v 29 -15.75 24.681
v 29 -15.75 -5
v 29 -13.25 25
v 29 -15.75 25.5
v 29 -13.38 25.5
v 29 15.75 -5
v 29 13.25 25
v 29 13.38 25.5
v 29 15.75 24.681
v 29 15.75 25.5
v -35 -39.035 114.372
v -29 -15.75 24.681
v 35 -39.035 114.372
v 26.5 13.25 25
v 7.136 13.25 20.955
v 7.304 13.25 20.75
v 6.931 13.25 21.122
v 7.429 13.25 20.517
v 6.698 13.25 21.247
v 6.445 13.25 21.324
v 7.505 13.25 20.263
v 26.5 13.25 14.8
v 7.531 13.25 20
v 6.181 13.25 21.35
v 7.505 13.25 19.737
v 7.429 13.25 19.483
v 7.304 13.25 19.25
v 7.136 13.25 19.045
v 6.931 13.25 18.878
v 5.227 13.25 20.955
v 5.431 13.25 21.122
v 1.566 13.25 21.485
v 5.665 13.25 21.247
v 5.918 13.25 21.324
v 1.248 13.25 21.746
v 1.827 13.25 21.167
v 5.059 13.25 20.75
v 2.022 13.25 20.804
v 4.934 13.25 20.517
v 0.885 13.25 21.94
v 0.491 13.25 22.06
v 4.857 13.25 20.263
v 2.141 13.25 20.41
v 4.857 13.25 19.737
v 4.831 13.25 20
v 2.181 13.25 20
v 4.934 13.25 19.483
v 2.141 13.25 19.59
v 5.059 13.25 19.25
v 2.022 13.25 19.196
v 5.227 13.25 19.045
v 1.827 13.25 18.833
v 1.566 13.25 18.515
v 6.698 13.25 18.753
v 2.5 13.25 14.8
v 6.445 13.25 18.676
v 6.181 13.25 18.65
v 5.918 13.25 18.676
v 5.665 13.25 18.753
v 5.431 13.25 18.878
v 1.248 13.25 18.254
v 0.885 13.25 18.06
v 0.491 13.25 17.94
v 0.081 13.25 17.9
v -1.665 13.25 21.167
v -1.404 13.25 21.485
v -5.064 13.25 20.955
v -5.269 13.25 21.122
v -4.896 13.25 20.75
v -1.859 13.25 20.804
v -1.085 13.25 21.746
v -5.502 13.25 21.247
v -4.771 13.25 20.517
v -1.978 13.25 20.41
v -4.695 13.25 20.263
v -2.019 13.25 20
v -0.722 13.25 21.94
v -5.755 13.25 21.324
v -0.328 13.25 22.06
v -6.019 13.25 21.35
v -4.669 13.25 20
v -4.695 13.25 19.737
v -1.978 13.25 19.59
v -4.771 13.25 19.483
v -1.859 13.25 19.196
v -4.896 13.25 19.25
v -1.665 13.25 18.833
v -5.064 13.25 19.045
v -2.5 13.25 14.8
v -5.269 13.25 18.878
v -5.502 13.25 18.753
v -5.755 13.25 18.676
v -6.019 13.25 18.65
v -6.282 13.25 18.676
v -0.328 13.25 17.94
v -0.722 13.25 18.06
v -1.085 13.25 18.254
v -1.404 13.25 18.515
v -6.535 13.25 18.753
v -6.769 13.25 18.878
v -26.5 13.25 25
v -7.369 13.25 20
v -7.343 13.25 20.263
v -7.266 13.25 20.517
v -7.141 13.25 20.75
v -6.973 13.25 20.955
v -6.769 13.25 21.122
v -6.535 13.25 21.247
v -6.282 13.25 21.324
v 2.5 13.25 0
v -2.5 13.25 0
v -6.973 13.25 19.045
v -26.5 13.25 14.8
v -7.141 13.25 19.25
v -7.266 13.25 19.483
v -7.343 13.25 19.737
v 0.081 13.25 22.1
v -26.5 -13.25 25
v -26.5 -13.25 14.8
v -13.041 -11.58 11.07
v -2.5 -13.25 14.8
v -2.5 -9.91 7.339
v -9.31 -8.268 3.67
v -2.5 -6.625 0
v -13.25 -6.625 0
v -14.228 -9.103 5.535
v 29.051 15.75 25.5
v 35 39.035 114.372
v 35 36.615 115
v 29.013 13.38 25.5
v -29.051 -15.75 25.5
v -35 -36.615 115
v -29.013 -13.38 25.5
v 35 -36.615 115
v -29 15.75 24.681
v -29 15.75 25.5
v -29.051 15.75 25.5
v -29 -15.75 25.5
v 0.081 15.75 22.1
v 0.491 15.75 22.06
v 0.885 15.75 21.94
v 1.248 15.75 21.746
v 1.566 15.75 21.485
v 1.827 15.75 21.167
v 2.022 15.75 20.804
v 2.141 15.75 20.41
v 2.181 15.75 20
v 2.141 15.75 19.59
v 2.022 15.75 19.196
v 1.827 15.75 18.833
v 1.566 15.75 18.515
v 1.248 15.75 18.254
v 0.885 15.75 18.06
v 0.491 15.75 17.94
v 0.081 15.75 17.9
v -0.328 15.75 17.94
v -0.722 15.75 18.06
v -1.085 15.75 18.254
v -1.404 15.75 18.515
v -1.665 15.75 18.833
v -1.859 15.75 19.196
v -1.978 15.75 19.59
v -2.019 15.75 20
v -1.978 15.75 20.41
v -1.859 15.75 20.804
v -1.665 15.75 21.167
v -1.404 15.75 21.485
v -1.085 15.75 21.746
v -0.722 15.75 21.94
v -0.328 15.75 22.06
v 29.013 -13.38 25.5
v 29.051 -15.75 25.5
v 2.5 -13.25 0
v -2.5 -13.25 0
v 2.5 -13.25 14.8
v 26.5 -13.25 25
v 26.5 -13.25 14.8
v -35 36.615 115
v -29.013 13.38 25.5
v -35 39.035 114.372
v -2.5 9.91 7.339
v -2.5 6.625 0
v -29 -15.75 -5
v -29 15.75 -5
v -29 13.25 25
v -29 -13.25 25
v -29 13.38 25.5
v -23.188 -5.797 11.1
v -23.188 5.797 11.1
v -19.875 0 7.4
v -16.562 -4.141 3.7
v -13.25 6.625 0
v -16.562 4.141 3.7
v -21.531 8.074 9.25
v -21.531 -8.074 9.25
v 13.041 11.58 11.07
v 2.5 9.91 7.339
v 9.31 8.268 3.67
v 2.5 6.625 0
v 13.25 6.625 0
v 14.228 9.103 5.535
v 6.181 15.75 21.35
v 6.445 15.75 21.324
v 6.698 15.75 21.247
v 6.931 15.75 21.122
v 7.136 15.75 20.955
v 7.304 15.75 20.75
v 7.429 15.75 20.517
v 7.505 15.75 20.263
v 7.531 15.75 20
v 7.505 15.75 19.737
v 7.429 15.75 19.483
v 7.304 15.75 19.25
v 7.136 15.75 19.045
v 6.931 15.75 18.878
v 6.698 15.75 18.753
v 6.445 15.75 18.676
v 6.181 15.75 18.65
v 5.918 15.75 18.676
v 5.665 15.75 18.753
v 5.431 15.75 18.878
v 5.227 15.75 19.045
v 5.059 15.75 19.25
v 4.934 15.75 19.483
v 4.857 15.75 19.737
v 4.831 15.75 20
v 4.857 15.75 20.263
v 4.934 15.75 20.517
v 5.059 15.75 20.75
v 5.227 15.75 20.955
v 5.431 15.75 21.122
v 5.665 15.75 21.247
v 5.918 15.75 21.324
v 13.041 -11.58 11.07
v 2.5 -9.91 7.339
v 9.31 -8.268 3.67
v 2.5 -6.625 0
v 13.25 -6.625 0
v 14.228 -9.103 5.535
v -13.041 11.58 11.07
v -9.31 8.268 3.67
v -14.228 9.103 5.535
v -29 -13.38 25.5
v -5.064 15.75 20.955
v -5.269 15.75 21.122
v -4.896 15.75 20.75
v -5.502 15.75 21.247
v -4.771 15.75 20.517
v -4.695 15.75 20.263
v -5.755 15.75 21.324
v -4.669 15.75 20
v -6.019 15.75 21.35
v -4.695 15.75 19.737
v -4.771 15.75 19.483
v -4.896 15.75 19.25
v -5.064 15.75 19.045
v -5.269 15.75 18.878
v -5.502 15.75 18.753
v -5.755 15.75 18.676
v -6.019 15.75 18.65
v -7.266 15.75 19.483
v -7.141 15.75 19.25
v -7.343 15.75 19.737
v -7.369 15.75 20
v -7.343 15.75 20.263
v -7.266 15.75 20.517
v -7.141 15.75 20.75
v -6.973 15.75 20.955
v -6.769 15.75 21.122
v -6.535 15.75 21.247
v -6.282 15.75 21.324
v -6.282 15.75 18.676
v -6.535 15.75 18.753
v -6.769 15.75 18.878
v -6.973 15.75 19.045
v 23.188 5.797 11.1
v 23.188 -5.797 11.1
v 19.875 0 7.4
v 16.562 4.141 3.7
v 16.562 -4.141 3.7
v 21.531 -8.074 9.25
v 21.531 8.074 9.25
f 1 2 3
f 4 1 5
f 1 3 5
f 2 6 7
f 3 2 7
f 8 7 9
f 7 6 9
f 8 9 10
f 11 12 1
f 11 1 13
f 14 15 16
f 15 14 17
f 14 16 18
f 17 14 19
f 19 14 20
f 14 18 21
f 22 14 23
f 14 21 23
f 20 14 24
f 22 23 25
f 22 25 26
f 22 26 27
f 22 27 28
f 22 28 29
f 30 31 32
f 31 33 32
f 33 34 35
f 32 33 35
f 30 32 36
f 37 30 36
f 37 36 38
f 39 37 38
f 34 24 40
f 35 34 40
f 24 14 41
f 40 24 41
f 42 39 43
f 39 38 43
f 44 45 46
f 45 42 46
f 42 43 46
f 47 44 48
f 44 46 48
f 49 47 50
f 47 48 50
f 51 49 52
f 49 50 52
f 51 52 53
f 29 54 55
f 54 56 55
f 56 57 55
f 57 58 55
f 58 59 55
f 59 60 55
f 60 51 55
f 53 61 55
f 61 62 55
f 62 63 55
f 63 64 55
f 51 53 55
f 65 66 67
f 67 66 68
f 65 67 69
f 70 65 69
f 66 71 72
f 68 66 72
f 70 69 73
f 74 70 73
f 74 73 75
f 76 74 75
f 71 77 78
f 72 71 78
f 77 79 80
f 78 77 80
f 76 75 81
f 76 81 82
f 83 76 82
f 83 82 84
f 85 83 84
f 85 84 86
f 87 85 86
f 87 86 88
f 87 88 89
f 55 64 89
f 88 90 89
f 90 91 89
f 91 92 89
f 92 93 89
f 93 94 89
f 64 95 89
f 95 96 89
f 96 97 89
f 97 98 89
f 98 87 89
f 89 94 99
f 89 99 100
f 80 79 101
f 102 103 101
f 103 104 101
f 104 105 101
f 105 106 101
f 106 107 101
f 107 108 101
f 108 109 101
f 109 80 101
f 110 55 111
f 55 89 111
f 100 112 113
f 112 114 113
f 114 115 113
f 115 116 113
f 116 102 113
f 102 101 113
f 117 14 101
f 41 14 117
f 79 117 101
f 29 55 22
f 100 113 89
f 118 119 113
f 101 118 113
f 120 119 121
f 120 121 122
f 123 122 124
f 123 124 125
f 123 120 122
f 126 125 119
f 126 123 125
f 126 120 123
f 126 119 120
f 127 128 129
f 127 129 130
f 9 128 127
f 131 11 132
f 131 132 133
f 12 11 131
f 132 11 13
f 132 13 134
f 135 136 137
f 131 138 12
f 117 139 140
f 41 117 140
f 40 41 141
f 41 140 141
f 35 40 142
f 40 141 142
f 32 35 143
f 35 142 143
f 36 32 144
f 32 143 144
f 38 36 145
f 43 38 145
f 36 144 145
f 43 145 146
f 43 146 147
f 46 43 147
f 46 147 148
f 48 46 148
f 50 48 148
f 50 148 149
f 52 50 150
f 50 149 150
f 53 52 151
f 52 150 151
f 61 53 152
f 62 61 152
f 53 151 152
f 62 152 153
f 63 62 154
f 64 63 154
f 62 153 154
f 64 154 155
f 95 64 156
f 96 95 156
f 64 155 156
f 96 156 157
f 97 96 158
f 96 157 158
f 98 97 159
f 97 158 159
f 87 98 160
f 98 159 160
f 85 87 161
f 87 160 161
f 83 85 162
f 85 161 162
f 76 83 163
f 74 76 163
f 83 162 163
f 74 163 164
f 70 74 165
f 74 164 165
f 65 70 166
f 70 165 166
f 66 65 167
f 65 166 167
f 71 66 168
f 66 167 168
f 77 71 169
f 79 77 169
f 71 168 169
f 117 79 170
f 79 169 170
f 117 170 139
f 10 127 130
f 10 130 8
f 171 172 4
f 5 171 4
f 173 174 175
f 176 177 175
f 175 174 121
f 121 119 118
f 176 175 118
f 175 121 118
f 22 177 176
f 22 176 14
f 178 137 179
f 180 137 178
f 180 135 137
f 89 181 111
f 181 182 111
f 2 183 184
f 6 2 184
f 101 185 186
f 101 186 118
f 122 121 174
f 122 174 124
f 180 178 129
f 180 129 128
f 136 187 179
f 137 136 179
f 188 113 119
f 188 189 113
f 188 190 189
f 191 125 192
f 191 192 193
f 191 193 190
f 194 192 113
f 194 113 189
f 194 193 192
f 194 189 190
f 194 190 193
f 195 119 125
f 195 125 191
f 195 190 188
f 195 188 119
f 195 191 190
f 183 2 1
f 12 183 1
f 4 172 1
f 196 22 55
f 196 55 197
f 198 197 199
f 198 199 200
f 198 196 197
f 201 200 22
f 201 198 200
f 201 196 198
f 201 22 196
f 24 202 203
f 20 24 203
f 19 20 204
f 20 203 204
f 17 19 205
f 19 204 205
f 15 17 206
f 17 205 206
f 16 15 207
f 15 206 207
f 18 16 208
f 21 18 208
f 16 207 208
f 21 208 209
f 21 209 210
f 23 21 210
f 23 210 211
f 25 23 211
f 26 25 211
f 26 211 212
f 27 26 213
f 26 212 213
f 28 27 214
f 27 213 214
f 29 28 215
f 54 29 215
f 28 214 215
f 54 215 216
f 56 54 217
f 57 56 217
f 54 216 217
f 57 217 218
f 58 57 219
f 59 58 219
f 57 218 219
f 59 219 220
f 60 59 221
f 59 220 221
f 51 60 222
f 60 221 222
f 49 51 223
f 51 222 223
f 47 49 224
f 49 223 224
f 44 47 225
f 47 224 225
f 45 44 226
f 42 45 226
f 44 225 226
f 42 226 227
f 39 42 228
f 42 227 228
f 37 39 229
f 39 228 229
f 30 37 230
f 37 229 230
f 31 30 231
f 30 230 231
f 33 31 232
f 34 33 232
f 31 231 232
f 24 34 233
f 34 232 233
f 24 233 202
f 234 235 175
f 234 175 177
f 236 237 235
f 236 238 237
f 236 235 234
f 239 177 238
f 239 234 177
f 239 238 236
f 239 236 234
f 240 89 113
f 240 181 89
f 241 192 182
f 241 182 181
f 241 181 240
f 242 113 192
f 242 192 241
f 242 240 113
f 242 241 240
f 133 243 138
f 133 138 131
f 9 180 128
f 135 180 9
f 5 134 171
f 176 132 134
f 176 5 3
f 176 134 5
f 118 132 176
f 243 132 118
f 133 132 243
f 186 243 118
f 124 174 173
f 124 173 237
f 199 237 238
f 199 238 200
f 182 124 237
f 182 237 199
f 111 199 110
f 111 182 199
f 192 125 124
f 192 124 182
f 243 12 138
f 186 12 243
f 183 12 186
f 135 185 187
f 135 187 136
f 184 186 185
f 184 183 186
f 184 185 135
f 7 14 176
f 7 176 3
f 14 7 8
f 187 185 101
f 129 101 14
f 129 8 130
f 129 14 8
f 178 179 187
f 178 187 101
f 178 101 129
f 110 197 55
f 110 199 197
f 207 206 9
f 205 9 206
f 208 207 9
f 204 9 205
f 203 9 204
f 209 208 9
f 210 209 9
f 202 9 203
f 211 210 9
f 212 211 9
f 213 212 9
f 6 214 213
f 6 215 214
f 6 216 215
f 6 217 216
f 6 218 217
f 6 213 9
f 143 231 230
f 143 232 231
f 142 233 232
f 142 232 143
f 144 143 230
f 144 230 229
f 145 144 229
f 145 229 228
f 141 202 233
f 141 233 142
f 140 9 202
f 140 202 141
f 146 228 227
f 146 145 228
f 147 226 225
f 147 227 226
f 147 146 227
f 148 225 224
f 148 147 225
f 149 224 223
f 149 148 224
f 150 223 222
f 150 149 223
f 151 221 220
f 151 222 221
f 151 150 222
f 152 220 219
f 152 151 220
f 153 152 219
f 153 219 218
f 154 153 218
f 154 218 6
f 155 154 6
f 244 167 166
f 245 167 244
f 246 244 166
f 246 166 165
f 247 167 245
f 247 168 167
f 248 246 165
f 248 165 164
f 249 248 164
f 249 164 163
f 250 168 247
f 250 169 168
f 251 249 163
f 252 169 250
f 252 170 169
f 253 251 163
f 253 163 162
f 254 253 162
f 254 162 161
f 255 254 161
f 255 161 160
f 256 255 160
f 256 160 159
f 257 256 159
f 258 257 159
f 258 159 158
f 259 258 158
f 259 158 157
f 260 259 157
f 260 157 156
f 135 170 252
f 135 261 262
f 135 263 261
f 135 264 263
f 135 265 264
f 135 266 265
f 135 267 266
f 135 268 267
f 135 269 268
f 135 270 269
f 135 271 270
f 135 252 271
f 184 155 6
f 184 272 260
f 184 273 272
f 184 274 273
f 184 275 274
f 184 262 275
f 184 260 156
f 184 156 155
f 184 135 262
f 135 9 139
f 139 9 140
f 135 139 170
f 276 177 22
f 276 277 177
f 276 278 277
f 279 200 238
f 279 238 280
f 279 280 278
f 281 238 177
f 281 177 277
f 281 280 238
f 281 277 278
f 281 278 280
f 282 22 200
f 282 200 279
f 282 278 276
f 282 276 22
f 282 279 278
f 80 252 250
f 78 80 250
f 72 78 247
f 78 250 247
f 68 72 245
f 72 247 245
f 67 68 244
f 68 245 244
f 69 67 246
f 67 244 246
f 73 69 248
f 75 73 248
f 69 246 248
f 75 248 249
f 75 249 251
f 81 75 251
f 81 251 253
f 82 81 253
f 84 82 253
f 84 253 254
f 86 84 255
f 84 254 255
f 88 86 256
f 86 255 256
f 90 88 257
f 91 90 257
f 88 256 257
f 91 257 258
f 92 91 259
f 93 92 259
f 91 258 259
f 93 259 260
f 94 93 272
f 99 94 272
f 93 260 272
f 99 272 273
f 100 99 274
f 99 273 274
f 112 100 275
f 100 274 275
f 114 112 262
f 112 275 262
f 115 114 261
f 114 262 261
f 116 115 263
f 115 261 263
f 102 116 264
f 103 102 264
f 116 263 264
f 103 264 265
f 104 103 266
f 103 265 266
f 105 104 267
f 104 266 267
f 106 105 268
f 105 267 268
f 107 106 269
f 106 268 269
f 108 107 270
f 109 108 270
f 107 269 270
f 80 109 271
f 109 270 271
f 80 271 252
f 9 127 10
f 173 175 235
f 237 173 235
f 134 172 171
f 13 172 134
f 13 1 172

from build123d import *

# Parameters (mm, degrees)
CROQUIS1_W                   = 53
CROQUIS1_H                   = 26.5
SALIENTE_EXTRUIR1_DEPTH      = 14.8
CROQUIS8_W                   = 5
CROQUIS8_H                   = 26.5
CORTAR_EXTRUIR2_DEPTH        = 14.8
SALIENTE_EXTRUIR2_DEPTH      = 35
SALIENTE_EXTRUIR2_DEPTH_BACK = 35
CROQUIS12_W                  = 2.5
CROQUIS12_H                  = 26.5
SALIENTE_EXTRUIR3_DEPTH      = 25
CROQUIS13_W                  = 6
CROQUIS13_H                  = 29.680771502
CORTAR_EXTRUIR3_DEPTH        = 31.5
CORTAR_EXTRUIR13_DEPTH       = 2.5
CORTAR_EXTRUIR14_DEPTH       = 2.5
CROQUIS17_W                  = 6
CROQUIS17_H                  = 31.5
CORTAR_EXTRUIR11_DEPTH       = 30.5
CROQUIS18_R                  = 2.1
CROQUIS18_R_2                = 1.35
CORTAR_EXTRUIR12_DEPTH       = 2.5


with BuildPart() as part:
    # Croquis1 → Saliente-Extruir1 (new body)
    with BuildSketch(Plane.XY):
        Rectangle(CROQUIS1_W, CROQUIS1_H)
    extrude(amount=SALIENTE_EXTRUIR1_DEPTH)

    # Croquis5 → Cortar-Recubrir3 section 0
    with BuildSketch(Plane.XY.offset(14.8)):
        with BuildLine():
            Line((-26.5, 13.25), (-26.5, -13.25))
            Line((-26.5, -13.25), (26.5, -13.25))
            Line((26.5, -13.25), (26.5, 13.25))
            Line((26.5, 13.25), (-26.5, 13.25))
        make_face()
    # Croquis6 → Cortar-Recubrir3 section 1
    with BuildSketch(Plane(origin=(0, 0, 0), x_dir=(-1, 0, 0), z_dir=(0, 0, -1))):
        with BuildLine():
            Line((-13.25, -6.625), (13.25, -6.625))
            Line((13.25, -6.625), (13.25, 6.625))
            Line((13.25, 6.625), (-13.25, 6.625))
            Line((-13.25, 6.625), (-13.25, -6.625))
        make_face()
    loft(mode=Mode.SUBTRACT)

    # Croquis8 → Cortar-Extruir2 (cut)
    with BuildSketch(Plane(origin=(0, 0, 0), x_dir=(-1, 0, 0), z_dir=(0, 0, -1))):
        Rectangle(CROQUIS8_W, CROQUIS8_H)
    extrude(amount=-CORTAR_EXTRUIR2_DEPTH, mode=Mode.SUBTRACT)


with BuildPart() as cortar_extruir2_piece_1:
    # of the separate pieces the step leaves, piece 1, a body of its own (cortar_extruir2_pieces)
    add(part.part.solids().sort_by_distance((-26.5, -13.25, 0))[0])



with BuildPart() as cortar_extruir2_piece_2:
    # of the separate pieces the step leaves, piece 2, a body of its own (cortar_extruir2_pieces)
    add(part.part.solids().sort_by_distance((2.5, -13.25, 0))[0])


with BuildPart() as cortar_extruir2_piece_1_1:
    add(cortar_extruir2_piece_1.part)

    add(cortar_extruir2_piece_2.part)  # Saliente-Extruir2 merges Cortar-Extruir2 piece 2
    # Croquis10 → Saliente-Extruir2 (add, two sides: drawn at the far end of the back side and taken through both)
    with BuildSketch(Plane(origin=(0, 0, 0), x_dir=(0, 0, -1), z_dir=(1, 0, 0)).offset(-SALIENTE_EXTRUIR2_DEPTH_BACK)):
        Polygon((-14.8, 13.25), (-25, 13.25), (-115, 36.615427319), (-114.371786091, 39.035209806), (-24.680771502, 15.75), (5, 15.75), (5, 15), (5, -15.75), (-24.680771502, -15.75), (-114.371786091, -39.035209806), (-115, -36.615427319), (-25, -13.25), (-14.8, -13.25), (0, -13.25), (0, 13.25), align=None)
    extrude(amount=SALIENTE_EXTRUIR2_DEPTH + SALIENTE_EXTRUIR2_DEPTH_BACK)

    # Croquis12 → Saliente-Extruir3 (add)
    with BuildSketch(Plane.XY):
        with Locations((-27.75, 0)):
            Rectangle(CROQUIS12_W, CROQUIS12_H)
        with Locations((27.75, 0)):
            Rectangle(CROQUIS12_W, CROQUIS12_H)
    extrude(amount=SALIENTE_EXTRUIR3_DEPTH)

    # Croquis13 → Cortar-Extruir3 (cut)
    with BuildSketch(Plane(origin=(0, 15.75, 0), x_dir=(1, 0, 0), z_dir=(0, 1, 0))):
        with Locations((-32, -9.840385751)):
            Rectangle(CROQUIS13_W, CROQUIS13_H)
        with Locations((32, -9.840385751)):
            Rectangle(CROQUIS13_W, CROQUIS13_H)
    extrude(amount=-CORTAR_EXTRUIR3_DEPTH, mode=Mode.SUBTRACT)

    # Croquis14 → Cortar-Extruir13 (cut)
    with BuildSketch(Plane(origin=(0, 8.752554668, -2.272301999), x_dir=(1, 0, 0), z_dir=(0, 0.9679129947926777, -0.25128556367501503))):
        Polygon((35, -27.846587086), (29, -27.846587086), (35, -120.510922694), align=None)
        Polygon((-35, -27.846587086), (-35, -120.510922694), (-29, -27.846587086), align=None)
    extrude(amount=-CORTAR_EXTRUIR13_DEPTH, mode=Mode.SUBTRACT)

    # Croquis16 → Cortar-Extruir14 (cut)
    with BuildSketch(Plane(origin=(0, -8.752554668, -2.272301999), x_dir=(1, 0, 0), z_dir=(0, -0.9679129947926624, -0.25128556367507404))):
        Polygon((-35, 27.846587086), (-29, 27.846587086), (-35, 120.510922694), align=None)
        Polygon((35, 27.846587086), (35, 120.510922694), (29, 27.846587086), align=None)
    extrude(amount=-CORTAR_EXTRUIR14_DEPTH, mode=Mode.SUBTRACT)

    # Croquis17 → Cortar-Extruir11 (cut)
    with BuildSketch(Plane(origin=(0, 0, -5), x_dir=(-1, 0, 0), z_dir=(0, 0, -1))):
        with Locations((-32, 0)):
            Rectangle(CROQUIS17_W, CROQUIS17_H)
        with Locations((32, 0)):
            Rectangle(CROQUIS17_W, CROQUIS17_H)
    extrude(amount=-CORTAR_EXTRUIR11_DEPTH, mode=Mode.SUBTRACT)

    # Croquis18 → Cortar-Extruir12 (cut)
    with BuildSketch(Plane(origin=(0, 15.75, 0), x_dir=(1, 0, 0), z_dir=(0, 1, 0))):
        with Locations((0.081355667, -19.999867625)):
            Circle(CROQUIS18_R)
        with Locations((6.181355666, -20)):
            Circle(CROQUIS18_R_2)
        with Locations((-6.018644331, -20)):
            Circle(CROQUIS18_R_2)
    extrude(amount=-CORTAR_EXTRUIR12_DEPTH, mode=Mode.SUBTRACT)


solid = cortar_extruir2_piece_1_1.part
